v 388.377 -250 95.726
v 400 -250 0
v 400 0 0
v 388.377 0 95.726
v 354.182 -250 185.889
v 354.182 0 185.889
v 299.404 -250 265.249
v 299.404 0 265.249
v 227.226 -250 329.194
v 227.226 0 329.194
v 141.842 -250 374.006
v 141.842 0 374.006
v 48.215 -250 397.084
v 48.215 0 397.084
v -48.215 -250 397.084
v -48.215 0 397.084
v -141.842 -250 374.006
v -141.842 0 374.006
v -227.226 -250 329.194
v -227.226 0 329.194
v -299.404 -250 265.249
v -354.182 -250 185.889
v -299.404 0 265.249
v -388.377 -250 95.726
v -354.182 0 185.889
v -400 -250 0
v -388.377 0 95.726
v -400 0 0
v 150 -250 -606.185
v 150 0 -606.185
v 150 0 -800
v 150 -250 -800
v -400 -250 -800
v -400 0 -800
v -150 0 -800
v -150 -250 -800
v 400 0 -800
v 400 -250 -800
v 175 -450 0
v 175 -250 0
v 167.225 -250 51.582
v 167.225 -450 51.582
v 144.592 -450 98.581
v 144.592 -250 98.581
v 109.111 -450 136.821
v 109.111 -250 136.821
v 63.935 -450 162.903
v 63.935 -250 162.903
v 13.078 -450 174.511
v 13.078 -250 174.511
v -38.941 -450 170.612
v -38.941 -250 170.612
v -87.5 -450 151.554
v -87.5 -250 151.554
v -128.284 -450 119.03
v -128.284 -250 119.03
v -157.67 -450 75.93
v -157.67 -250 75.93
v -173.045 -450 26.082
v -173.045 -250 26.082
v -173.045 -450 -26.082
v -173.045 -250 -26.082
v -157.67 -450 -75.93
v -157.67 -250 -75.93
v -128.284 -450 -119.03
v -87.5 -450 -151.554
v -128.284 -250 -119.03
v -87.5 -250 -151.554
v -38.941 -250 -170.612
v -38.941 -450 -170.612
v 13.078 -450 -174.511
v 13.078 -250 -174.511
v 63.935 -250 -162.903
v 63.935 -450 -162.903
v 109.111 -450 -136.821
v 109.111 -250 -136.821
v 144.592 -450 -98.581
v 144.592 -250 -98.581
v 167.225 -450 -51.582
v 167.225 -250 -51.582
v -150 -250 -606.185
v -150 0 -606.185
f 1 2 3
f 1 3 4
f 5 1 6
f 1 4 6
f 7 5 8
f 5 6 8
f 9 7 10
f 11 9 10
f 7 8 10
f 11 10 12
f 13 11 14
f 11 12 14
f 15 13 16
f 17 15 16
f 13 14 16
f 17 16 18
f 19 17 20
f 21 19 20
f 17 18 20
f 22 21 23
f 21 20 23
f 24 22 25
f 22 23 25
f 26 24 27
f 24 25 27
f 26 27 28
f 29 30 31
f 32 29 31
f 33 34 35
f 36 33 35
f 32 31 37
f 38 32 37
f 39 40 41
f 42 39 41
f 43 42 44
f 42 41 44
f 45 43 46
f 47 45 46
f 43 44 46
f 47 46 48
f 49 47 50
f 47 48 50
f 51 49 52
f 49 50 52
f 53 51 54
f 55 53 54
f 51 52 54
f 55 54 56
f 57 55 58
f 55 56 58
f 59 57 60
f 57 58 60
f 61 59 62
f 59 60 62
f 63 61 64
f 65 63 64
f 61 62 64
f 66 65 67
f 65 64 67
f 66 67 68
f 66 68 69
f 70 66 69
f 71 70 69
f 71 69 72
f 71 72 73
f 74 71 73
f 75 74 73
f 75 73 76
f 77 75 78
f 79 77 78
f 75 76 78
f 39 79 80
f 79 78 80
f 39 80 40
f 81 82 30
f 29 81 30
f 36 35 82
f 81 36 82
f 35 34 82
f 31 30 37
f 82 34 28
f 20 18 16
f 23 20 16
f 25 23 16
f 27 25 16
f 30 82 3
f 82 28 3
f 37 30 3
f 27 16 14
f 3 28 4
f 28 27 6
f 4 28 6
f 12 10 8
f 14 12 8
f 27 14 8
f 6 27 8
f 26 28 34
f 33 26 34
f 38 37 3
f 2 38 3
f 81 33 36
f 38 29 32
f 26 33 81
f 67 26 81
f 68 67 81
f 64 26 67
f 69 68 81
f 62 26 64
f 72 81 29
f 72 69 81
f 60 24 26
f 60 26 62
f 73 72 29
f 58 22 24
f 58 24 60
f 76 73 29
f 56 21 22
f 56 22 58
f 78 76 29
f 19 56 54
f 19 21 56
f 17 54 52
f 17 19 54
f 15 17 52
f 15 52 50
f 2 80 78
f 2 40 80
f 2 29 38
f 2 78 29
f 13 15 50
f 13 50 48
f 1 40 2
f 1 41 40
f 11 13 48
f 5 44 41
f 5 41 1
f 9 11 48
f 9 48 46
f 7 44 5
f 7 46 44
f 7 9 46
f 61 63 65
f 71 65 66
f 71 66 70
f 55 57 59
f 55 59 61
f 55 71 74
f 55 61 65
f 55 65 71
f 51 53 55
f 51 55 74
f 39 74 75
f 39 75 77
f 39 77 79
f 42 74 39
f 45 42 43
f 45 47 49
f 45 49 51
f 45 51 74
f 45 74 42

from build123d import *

# Parameters (mm, degrees)
F1_DEPTH = 250
F2_R     = 175
F3_DEPTH = 200


with BuildPart() as f1:
    # F0 (on Front) → F1 (new body)
    with BuildSketch(Plane.XZ):
        with BuildLine():
            Line((400, -800), (400, 0))
            ThreePointArc((400, 0), (0, 400), (-400, 0))
            Line((-400, 0), (-400, -800))
            Line((-400, -800), (-150, -800))
            Line((-150, -800), (-150, -606.184542))
            Line((-150, -606.184542), (150, -606.184542))
            Line((150, -606.184542), (150, -800))
            Line((150, -800), (400, -800))
        make_face()
    extrude(amount=F1_DEPTH)

    # F2 (on face) → F3 (join)
    with BuildSketch(Plane.XZ.offset(250)):
        Circle(F2_R)
    extrude(amount=F3_DEPTH)


solid = f1.part
